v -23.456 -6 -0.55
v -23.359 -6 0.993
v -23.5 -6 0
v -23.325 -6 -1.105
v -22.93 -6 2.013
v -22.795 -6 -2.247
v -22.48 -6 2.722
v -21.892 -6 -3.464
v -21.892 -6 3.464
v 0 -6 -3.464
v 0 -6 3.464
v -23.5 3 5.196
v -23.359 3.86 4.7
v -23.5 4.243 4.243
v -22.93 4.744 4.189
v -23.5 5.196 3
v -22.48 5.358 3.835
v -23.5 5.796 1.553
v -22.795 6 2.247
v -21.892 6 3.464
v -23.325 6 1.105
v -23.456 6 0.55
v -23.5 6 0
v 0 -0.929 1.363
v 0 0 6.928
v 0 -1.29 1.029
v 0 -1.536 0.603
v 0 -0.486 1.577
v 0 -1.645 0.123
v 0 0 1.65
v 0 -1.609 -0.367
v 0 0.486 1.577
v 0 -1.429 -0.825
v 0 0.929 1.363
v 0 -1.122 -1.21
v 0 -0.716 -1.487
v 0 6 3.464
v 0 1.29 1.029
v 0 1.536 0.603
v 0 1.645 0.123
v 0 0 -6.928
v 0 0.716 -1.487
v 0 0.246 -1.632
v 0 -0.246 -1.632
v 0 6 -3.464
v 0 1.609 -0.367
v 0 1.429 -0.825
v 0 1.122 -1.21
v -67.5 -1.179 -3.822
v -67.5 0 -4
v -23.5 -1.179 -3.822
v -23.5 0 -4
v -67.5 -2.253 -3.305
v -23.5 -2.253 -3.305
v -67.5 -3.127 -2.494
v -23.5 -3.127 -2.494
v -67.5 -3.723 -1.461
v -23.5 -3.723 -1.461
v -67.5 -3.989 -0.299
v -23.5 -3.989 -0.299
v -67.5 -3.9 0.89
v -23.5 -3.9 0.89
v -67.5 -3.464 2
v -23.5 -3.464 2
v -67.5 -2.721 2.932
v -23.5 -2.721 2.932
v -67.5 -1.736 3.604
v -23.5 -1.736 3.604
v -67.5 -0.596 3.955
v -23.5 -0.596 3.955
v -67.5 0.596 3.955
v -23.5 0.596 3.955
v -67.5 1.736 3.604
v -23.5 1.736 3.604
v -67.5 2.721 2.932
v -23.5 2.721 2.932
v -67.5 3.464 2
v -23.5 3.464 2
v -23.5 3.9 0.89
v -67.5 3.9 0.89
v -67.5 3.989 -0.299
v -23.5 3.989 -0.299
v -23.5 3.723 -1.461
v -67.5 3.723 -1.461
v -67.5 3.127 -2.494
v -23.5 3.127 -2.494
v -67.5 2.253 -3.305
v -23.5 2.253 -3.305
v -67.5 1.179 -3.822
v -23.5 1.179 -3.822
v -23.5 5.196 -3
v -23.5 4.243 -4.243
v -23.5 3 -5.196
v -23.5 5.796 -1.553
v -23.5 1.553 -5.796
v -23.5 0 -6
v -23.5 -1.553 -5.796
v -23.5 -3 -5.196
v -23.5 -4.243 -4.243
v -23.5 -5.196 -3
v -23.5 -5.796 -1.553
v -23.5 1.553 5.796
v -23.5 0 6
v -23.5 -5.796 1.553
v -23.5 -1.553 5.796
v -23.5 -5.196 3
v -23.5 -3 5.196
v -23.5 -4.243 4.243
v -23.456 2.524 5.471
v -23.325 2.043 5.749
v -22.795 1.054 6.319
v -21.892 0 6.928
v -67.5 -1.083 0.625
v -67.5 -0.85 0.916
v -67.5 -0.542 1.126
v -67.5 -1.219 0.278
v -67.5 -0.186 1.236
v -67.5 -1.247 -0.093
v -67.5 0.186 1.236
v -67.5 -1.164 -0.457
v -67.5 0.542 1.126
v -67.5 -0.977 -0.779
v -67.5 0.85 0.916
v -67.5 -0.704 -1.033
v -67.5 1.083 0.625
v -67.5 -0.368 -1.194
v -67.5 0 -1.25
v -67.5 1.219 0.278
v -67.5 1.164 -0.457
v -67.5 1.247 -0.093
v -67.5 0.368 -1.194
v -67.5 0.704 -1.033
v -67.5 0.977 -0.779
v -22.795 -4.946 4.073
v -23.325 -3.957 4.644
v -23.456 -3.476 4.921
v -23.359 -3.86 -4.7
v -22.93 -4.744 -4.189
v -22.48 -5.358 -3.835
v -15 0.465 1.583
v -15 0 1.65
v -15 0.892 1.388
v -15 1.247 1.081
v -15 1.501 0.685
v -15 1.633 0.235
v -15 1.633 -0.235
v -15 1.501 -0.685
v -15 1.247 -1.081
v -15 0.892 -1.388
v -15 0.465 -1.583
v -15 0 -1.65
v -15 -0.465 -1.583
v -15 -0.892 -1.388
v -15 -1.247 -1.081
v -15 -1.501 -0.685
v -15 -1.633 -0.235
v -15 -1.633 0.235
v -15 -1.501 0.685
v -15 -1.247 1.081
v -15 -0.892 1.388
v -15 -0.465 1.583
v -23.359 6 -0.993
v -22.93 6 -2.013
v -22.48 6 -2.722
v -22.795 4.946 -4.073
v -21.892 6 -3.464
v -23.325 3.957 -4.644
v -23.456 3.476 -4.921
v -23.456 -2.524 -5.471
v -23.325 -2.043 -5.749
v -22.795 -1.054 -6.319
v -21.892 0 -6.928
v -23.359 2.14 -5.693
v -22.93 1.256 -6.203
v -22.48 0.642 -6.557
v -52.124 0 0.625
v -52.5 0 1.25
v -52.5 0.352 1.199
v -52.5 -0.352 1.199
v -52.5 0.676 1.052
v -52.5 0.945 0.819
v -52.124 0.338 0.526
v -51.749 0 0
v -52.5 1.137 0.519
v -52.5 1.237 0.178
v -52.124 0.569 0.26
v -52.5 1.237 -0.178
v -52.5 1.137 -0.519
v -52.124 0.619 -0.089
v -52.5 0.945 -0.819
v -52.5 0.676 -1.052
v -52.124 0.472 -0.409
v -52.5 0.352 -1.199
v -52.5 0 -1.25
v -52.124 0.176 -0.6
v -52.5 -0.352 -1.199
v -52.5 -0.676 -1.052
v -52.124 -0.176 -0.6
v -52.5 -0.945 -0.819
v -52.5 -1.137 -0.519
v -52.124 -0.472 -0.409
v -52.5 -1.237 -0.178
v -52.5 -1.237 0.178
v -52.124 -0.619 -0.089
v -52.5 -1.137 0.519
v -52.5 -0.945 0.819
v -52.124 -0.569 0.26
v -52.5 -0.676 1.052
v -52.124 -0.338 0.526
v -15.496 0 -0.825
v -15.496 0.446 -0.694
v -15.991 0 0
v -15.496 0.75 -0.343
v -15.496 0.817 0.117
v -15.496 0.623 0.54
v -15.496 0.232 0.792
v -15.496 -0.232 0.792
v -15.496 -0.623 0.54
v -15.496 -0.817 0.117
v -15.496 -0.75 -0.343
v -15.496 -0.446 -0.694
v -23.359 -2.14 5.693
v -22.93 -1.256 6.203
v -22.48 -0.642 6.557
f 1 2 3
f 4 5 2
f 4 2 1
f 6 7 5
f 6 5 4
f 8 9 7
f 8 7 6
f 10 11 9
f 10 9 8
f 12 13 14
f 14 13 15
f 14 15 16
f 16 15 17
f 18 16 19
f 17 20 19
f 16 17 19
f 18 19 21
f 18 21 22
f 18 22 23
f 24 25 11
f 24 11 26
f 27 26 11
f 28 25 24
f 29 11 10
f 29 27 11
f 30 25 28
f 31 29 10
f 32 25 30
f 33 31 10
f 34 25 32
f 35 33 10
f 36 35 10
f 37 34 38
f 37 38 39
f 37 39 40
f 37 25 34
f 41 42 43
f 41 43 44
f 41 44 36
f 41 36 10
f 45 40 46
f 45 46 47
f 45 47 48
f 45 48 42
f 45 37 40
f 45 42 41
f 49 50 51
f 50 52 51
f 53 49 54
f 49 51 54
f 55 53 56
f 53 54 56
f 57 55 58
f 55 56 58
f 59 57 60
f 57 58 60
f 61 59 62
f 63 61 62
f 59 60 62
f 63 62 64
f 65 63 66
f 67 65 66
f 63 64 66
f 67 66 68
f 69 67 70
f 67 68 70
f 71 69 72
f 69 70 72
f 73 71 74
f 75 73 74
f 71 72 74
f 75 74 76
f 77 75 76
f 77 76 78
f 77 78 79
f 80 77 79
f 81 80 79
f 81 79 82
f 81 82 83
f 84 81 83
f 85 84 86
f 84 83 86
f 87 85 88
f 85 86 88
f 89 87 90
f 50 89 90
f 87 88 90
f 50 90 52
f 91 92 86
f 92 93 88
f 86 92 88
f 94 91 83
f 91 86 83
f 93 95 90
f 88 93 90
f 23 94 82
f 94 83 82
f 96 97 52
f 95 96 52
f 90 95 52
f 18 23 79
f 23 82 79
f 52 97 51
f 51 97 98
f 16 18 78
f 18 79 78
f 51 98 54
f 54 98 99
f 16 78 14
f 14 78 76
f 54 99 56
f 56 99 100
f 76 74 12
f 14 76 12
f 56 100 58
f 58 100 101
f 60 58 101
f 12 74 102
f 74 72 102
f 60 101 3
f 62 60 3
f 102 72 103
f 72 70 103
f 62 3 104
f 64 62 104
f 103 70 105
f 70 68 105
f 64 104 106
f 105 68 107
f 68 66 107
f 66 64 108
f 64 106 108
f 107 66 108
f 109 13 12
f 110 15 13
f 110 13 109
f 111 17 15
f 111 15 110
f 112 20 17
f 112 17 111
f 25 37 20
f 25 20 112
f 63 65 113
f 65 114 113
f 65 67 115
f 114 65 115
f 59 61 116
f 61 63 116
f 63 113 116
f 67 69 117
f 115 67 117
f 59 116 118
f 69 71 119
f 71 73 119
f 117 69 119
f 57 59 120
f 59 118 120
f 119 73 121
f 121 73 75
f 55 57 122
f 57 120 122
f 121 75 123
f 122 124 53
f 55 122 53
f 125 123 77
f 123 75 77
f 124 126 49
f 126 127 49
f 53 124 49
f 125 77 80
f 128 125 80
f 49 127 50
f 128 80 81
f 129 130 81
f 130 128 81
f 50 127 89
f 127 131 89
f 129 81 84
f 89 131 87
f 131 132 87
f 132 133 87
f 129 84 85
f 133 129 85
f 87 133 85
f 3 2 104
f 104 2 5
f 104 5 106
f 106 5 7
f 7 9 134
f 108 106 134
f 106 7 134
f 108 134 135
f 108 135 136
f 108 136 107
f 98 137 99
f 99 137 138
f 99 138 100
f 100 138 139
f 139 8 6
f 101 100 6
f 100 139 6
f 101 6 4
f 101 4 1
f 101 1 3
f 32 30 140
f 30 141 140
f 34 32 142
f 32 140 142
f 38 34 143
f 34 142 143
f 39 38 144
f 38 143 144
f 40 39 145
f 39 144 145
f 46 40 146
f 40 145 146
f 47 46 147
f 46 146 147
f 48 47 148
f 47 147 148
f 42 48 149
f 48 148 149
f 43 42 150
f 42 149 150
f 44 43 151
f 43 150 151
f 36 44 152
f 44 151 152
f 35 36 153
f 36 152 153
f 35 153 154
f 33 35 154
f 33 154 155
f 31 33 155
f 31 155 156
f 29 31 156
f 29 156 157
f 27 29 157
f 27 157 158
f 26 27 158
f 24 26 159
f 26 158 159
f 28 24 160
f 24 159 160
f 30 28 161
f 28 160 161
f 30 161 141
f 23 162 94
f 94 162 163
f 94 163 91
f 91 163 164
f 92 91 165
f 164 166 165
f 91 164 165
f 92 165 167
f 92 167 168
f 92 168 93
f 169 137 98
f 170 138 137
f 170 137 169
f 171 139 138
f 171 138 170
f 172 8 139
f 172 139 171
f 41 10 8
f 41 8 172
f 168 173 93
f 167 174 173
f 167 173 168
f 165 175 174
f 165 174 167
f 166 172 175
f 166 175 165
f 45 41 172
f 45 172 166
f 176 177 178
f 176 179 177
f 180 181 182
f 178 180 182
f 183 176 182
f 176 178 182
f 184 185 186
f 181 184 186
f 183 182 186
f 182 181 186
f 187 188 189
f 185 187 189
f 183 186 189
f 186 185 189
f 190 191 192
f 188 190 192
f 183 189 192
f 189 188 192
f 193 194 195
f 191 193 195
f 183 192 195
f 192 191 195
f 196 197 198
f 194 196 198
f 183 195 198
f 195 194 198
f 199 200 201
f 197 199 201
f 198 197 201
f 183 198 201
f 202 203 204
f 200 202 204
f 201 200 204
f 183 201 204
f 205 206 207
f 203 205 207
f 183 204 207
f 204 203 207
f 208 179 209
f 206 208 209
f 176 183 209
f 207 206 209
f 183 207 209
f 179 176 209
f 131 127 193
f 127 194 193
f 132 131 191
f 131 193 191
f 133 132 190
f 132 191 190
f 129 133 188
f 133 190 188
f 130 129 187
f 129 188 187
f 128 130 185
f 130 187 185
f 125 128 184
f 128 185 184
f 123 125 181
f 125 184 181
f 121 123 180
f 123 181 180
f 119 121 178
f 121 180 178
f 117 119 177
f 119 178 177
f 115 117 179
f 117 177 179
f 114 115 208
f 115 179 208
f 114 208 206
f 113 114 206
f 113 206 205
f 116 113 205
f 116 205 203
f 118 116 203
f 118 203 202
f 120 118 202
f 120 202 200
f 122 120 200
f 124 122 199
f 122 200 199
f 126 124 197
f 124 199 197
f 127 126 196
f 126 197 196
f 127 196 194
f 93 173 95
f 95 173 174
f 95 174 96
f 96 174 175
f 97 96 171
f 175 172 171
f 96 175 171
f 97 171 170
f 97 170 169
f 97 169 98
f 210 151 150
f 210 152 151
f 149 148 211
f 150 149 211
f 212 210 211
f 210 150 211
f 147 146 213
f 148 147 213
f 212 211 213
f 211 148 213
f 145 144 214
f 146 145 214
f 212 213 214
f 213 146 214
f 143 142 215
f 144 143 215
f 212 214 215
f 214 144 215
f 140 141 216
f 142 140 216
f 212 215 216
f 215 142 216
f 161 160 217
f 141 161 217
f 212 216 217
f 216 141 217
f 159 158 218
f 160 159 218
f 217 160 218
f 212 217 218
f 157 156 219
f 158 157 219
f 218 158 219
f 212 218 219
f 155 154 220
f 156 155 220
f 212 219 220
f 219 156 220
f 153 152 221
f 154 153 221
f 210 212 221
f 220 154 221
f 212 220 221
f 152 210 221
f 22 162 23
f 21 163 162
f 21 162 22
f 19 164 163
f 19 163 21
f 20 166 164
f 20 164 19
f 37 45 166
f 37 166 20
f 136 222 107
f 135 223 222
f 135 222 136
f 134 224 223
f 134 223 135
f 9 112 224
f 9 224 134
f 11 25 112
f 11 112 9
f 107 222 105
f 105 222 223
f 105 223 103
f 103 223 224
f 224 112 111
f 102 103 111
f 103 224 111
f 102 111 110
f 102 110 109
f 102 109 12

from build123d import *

# Parameters (mm, degrees)
BOSS_EXTRU_1_DEPTH        = 67.5
TROU_TARAUD_M4X0_71_D     = 3.3
TROU_TARAUD_M4X0_71_DEPTH = 15
TROU_TARAUD_M4X0_71_TIP   = 0.991420021
TROU_TARAUD_M3X0_51_D     = 2.5
TROU_TARAUD_M3X0_51_DEPTH = 15
TROU_TARAUD_M3X0_51_TIP   = 0.751075774


with BuildPart() as part:
    # Esquisse1 → Boss.-Extru.1 (new body)
    with BuildSketch(Plane(origin=(0, 0, 0), x_dir=(0, 0, -1), z_dir=(1, 0, 0))):
        Polygon((6.92820323, 0), (3.464101615, 6), (-3.464101615, 6), (-6.92820323, 0), (-3.464101615, -6), (3.464101615, -6), align=None)
    extrude(amount=-BOSS_EXTRU_1_DEPTH)

    # Trou taraudé M4x0.71
    with Locations(Plane(origin=(0, 0, 0), x_dir=(0, 0, -1), z_dir=(1, 0, 0))):
        with Locations((0, 0)):
            Hole(TROU_TARAUD_M4X0_71_D / 2, depth=TROU_TARAUD_M4X0_71_DEPTH)
            with Locations((0, 0, -(TROU_TARAUD_M4X0_71_DEPTH + TROU_TARAUD_M4X0_71_TIP / 2))):  # 118° drill point
                Cone(0, TROU_TARAUD_M4X0_71_D / 2, TROU_TARAUD_M4X0_71_TIP, mode=Mode.SUBTRACT)

    # Trou taraudé M3x0.51
    with Locations(Plane.ZY.offset(67.5)):
        with Locations((0, 0)):
            Hole(TROU_TARAUD_M3X0_51_D / 2, depth=TROU_TARAUD_M3X0_51_DEPTH)
            with Locations((0, 0, -(TROU_TARAUD_M3X0_51_DEPTH + TROU_TARAUD_M3X0_51_TIP / 2))):  # 118° drill point
                Cone(0, TROU_TARAUD_M3X0_51_D / 2, TROU_TARAUD_M3X0_51_TIP, mode=Mode.SUBTRACT)

    # Esquisse4 → Enlèvement de matière-Révolution1 (revolve, cut)
    with BuildSketch(Plane(origin=(0, 0, 0), x_dir=(1, 0, 0), z_dir=(0, 1, 0))):
        Polygon((-21.892304845, 6.92820323), (-67.5, 6.92820323), (-67.5, 4), (-23.5, 4), (-23.5, 6), align=None)
    revolve(axis=Axis((0, 0, 0), (-1, 0, 0)), mode=Mode.SUBTRACT)


solid = part.part
